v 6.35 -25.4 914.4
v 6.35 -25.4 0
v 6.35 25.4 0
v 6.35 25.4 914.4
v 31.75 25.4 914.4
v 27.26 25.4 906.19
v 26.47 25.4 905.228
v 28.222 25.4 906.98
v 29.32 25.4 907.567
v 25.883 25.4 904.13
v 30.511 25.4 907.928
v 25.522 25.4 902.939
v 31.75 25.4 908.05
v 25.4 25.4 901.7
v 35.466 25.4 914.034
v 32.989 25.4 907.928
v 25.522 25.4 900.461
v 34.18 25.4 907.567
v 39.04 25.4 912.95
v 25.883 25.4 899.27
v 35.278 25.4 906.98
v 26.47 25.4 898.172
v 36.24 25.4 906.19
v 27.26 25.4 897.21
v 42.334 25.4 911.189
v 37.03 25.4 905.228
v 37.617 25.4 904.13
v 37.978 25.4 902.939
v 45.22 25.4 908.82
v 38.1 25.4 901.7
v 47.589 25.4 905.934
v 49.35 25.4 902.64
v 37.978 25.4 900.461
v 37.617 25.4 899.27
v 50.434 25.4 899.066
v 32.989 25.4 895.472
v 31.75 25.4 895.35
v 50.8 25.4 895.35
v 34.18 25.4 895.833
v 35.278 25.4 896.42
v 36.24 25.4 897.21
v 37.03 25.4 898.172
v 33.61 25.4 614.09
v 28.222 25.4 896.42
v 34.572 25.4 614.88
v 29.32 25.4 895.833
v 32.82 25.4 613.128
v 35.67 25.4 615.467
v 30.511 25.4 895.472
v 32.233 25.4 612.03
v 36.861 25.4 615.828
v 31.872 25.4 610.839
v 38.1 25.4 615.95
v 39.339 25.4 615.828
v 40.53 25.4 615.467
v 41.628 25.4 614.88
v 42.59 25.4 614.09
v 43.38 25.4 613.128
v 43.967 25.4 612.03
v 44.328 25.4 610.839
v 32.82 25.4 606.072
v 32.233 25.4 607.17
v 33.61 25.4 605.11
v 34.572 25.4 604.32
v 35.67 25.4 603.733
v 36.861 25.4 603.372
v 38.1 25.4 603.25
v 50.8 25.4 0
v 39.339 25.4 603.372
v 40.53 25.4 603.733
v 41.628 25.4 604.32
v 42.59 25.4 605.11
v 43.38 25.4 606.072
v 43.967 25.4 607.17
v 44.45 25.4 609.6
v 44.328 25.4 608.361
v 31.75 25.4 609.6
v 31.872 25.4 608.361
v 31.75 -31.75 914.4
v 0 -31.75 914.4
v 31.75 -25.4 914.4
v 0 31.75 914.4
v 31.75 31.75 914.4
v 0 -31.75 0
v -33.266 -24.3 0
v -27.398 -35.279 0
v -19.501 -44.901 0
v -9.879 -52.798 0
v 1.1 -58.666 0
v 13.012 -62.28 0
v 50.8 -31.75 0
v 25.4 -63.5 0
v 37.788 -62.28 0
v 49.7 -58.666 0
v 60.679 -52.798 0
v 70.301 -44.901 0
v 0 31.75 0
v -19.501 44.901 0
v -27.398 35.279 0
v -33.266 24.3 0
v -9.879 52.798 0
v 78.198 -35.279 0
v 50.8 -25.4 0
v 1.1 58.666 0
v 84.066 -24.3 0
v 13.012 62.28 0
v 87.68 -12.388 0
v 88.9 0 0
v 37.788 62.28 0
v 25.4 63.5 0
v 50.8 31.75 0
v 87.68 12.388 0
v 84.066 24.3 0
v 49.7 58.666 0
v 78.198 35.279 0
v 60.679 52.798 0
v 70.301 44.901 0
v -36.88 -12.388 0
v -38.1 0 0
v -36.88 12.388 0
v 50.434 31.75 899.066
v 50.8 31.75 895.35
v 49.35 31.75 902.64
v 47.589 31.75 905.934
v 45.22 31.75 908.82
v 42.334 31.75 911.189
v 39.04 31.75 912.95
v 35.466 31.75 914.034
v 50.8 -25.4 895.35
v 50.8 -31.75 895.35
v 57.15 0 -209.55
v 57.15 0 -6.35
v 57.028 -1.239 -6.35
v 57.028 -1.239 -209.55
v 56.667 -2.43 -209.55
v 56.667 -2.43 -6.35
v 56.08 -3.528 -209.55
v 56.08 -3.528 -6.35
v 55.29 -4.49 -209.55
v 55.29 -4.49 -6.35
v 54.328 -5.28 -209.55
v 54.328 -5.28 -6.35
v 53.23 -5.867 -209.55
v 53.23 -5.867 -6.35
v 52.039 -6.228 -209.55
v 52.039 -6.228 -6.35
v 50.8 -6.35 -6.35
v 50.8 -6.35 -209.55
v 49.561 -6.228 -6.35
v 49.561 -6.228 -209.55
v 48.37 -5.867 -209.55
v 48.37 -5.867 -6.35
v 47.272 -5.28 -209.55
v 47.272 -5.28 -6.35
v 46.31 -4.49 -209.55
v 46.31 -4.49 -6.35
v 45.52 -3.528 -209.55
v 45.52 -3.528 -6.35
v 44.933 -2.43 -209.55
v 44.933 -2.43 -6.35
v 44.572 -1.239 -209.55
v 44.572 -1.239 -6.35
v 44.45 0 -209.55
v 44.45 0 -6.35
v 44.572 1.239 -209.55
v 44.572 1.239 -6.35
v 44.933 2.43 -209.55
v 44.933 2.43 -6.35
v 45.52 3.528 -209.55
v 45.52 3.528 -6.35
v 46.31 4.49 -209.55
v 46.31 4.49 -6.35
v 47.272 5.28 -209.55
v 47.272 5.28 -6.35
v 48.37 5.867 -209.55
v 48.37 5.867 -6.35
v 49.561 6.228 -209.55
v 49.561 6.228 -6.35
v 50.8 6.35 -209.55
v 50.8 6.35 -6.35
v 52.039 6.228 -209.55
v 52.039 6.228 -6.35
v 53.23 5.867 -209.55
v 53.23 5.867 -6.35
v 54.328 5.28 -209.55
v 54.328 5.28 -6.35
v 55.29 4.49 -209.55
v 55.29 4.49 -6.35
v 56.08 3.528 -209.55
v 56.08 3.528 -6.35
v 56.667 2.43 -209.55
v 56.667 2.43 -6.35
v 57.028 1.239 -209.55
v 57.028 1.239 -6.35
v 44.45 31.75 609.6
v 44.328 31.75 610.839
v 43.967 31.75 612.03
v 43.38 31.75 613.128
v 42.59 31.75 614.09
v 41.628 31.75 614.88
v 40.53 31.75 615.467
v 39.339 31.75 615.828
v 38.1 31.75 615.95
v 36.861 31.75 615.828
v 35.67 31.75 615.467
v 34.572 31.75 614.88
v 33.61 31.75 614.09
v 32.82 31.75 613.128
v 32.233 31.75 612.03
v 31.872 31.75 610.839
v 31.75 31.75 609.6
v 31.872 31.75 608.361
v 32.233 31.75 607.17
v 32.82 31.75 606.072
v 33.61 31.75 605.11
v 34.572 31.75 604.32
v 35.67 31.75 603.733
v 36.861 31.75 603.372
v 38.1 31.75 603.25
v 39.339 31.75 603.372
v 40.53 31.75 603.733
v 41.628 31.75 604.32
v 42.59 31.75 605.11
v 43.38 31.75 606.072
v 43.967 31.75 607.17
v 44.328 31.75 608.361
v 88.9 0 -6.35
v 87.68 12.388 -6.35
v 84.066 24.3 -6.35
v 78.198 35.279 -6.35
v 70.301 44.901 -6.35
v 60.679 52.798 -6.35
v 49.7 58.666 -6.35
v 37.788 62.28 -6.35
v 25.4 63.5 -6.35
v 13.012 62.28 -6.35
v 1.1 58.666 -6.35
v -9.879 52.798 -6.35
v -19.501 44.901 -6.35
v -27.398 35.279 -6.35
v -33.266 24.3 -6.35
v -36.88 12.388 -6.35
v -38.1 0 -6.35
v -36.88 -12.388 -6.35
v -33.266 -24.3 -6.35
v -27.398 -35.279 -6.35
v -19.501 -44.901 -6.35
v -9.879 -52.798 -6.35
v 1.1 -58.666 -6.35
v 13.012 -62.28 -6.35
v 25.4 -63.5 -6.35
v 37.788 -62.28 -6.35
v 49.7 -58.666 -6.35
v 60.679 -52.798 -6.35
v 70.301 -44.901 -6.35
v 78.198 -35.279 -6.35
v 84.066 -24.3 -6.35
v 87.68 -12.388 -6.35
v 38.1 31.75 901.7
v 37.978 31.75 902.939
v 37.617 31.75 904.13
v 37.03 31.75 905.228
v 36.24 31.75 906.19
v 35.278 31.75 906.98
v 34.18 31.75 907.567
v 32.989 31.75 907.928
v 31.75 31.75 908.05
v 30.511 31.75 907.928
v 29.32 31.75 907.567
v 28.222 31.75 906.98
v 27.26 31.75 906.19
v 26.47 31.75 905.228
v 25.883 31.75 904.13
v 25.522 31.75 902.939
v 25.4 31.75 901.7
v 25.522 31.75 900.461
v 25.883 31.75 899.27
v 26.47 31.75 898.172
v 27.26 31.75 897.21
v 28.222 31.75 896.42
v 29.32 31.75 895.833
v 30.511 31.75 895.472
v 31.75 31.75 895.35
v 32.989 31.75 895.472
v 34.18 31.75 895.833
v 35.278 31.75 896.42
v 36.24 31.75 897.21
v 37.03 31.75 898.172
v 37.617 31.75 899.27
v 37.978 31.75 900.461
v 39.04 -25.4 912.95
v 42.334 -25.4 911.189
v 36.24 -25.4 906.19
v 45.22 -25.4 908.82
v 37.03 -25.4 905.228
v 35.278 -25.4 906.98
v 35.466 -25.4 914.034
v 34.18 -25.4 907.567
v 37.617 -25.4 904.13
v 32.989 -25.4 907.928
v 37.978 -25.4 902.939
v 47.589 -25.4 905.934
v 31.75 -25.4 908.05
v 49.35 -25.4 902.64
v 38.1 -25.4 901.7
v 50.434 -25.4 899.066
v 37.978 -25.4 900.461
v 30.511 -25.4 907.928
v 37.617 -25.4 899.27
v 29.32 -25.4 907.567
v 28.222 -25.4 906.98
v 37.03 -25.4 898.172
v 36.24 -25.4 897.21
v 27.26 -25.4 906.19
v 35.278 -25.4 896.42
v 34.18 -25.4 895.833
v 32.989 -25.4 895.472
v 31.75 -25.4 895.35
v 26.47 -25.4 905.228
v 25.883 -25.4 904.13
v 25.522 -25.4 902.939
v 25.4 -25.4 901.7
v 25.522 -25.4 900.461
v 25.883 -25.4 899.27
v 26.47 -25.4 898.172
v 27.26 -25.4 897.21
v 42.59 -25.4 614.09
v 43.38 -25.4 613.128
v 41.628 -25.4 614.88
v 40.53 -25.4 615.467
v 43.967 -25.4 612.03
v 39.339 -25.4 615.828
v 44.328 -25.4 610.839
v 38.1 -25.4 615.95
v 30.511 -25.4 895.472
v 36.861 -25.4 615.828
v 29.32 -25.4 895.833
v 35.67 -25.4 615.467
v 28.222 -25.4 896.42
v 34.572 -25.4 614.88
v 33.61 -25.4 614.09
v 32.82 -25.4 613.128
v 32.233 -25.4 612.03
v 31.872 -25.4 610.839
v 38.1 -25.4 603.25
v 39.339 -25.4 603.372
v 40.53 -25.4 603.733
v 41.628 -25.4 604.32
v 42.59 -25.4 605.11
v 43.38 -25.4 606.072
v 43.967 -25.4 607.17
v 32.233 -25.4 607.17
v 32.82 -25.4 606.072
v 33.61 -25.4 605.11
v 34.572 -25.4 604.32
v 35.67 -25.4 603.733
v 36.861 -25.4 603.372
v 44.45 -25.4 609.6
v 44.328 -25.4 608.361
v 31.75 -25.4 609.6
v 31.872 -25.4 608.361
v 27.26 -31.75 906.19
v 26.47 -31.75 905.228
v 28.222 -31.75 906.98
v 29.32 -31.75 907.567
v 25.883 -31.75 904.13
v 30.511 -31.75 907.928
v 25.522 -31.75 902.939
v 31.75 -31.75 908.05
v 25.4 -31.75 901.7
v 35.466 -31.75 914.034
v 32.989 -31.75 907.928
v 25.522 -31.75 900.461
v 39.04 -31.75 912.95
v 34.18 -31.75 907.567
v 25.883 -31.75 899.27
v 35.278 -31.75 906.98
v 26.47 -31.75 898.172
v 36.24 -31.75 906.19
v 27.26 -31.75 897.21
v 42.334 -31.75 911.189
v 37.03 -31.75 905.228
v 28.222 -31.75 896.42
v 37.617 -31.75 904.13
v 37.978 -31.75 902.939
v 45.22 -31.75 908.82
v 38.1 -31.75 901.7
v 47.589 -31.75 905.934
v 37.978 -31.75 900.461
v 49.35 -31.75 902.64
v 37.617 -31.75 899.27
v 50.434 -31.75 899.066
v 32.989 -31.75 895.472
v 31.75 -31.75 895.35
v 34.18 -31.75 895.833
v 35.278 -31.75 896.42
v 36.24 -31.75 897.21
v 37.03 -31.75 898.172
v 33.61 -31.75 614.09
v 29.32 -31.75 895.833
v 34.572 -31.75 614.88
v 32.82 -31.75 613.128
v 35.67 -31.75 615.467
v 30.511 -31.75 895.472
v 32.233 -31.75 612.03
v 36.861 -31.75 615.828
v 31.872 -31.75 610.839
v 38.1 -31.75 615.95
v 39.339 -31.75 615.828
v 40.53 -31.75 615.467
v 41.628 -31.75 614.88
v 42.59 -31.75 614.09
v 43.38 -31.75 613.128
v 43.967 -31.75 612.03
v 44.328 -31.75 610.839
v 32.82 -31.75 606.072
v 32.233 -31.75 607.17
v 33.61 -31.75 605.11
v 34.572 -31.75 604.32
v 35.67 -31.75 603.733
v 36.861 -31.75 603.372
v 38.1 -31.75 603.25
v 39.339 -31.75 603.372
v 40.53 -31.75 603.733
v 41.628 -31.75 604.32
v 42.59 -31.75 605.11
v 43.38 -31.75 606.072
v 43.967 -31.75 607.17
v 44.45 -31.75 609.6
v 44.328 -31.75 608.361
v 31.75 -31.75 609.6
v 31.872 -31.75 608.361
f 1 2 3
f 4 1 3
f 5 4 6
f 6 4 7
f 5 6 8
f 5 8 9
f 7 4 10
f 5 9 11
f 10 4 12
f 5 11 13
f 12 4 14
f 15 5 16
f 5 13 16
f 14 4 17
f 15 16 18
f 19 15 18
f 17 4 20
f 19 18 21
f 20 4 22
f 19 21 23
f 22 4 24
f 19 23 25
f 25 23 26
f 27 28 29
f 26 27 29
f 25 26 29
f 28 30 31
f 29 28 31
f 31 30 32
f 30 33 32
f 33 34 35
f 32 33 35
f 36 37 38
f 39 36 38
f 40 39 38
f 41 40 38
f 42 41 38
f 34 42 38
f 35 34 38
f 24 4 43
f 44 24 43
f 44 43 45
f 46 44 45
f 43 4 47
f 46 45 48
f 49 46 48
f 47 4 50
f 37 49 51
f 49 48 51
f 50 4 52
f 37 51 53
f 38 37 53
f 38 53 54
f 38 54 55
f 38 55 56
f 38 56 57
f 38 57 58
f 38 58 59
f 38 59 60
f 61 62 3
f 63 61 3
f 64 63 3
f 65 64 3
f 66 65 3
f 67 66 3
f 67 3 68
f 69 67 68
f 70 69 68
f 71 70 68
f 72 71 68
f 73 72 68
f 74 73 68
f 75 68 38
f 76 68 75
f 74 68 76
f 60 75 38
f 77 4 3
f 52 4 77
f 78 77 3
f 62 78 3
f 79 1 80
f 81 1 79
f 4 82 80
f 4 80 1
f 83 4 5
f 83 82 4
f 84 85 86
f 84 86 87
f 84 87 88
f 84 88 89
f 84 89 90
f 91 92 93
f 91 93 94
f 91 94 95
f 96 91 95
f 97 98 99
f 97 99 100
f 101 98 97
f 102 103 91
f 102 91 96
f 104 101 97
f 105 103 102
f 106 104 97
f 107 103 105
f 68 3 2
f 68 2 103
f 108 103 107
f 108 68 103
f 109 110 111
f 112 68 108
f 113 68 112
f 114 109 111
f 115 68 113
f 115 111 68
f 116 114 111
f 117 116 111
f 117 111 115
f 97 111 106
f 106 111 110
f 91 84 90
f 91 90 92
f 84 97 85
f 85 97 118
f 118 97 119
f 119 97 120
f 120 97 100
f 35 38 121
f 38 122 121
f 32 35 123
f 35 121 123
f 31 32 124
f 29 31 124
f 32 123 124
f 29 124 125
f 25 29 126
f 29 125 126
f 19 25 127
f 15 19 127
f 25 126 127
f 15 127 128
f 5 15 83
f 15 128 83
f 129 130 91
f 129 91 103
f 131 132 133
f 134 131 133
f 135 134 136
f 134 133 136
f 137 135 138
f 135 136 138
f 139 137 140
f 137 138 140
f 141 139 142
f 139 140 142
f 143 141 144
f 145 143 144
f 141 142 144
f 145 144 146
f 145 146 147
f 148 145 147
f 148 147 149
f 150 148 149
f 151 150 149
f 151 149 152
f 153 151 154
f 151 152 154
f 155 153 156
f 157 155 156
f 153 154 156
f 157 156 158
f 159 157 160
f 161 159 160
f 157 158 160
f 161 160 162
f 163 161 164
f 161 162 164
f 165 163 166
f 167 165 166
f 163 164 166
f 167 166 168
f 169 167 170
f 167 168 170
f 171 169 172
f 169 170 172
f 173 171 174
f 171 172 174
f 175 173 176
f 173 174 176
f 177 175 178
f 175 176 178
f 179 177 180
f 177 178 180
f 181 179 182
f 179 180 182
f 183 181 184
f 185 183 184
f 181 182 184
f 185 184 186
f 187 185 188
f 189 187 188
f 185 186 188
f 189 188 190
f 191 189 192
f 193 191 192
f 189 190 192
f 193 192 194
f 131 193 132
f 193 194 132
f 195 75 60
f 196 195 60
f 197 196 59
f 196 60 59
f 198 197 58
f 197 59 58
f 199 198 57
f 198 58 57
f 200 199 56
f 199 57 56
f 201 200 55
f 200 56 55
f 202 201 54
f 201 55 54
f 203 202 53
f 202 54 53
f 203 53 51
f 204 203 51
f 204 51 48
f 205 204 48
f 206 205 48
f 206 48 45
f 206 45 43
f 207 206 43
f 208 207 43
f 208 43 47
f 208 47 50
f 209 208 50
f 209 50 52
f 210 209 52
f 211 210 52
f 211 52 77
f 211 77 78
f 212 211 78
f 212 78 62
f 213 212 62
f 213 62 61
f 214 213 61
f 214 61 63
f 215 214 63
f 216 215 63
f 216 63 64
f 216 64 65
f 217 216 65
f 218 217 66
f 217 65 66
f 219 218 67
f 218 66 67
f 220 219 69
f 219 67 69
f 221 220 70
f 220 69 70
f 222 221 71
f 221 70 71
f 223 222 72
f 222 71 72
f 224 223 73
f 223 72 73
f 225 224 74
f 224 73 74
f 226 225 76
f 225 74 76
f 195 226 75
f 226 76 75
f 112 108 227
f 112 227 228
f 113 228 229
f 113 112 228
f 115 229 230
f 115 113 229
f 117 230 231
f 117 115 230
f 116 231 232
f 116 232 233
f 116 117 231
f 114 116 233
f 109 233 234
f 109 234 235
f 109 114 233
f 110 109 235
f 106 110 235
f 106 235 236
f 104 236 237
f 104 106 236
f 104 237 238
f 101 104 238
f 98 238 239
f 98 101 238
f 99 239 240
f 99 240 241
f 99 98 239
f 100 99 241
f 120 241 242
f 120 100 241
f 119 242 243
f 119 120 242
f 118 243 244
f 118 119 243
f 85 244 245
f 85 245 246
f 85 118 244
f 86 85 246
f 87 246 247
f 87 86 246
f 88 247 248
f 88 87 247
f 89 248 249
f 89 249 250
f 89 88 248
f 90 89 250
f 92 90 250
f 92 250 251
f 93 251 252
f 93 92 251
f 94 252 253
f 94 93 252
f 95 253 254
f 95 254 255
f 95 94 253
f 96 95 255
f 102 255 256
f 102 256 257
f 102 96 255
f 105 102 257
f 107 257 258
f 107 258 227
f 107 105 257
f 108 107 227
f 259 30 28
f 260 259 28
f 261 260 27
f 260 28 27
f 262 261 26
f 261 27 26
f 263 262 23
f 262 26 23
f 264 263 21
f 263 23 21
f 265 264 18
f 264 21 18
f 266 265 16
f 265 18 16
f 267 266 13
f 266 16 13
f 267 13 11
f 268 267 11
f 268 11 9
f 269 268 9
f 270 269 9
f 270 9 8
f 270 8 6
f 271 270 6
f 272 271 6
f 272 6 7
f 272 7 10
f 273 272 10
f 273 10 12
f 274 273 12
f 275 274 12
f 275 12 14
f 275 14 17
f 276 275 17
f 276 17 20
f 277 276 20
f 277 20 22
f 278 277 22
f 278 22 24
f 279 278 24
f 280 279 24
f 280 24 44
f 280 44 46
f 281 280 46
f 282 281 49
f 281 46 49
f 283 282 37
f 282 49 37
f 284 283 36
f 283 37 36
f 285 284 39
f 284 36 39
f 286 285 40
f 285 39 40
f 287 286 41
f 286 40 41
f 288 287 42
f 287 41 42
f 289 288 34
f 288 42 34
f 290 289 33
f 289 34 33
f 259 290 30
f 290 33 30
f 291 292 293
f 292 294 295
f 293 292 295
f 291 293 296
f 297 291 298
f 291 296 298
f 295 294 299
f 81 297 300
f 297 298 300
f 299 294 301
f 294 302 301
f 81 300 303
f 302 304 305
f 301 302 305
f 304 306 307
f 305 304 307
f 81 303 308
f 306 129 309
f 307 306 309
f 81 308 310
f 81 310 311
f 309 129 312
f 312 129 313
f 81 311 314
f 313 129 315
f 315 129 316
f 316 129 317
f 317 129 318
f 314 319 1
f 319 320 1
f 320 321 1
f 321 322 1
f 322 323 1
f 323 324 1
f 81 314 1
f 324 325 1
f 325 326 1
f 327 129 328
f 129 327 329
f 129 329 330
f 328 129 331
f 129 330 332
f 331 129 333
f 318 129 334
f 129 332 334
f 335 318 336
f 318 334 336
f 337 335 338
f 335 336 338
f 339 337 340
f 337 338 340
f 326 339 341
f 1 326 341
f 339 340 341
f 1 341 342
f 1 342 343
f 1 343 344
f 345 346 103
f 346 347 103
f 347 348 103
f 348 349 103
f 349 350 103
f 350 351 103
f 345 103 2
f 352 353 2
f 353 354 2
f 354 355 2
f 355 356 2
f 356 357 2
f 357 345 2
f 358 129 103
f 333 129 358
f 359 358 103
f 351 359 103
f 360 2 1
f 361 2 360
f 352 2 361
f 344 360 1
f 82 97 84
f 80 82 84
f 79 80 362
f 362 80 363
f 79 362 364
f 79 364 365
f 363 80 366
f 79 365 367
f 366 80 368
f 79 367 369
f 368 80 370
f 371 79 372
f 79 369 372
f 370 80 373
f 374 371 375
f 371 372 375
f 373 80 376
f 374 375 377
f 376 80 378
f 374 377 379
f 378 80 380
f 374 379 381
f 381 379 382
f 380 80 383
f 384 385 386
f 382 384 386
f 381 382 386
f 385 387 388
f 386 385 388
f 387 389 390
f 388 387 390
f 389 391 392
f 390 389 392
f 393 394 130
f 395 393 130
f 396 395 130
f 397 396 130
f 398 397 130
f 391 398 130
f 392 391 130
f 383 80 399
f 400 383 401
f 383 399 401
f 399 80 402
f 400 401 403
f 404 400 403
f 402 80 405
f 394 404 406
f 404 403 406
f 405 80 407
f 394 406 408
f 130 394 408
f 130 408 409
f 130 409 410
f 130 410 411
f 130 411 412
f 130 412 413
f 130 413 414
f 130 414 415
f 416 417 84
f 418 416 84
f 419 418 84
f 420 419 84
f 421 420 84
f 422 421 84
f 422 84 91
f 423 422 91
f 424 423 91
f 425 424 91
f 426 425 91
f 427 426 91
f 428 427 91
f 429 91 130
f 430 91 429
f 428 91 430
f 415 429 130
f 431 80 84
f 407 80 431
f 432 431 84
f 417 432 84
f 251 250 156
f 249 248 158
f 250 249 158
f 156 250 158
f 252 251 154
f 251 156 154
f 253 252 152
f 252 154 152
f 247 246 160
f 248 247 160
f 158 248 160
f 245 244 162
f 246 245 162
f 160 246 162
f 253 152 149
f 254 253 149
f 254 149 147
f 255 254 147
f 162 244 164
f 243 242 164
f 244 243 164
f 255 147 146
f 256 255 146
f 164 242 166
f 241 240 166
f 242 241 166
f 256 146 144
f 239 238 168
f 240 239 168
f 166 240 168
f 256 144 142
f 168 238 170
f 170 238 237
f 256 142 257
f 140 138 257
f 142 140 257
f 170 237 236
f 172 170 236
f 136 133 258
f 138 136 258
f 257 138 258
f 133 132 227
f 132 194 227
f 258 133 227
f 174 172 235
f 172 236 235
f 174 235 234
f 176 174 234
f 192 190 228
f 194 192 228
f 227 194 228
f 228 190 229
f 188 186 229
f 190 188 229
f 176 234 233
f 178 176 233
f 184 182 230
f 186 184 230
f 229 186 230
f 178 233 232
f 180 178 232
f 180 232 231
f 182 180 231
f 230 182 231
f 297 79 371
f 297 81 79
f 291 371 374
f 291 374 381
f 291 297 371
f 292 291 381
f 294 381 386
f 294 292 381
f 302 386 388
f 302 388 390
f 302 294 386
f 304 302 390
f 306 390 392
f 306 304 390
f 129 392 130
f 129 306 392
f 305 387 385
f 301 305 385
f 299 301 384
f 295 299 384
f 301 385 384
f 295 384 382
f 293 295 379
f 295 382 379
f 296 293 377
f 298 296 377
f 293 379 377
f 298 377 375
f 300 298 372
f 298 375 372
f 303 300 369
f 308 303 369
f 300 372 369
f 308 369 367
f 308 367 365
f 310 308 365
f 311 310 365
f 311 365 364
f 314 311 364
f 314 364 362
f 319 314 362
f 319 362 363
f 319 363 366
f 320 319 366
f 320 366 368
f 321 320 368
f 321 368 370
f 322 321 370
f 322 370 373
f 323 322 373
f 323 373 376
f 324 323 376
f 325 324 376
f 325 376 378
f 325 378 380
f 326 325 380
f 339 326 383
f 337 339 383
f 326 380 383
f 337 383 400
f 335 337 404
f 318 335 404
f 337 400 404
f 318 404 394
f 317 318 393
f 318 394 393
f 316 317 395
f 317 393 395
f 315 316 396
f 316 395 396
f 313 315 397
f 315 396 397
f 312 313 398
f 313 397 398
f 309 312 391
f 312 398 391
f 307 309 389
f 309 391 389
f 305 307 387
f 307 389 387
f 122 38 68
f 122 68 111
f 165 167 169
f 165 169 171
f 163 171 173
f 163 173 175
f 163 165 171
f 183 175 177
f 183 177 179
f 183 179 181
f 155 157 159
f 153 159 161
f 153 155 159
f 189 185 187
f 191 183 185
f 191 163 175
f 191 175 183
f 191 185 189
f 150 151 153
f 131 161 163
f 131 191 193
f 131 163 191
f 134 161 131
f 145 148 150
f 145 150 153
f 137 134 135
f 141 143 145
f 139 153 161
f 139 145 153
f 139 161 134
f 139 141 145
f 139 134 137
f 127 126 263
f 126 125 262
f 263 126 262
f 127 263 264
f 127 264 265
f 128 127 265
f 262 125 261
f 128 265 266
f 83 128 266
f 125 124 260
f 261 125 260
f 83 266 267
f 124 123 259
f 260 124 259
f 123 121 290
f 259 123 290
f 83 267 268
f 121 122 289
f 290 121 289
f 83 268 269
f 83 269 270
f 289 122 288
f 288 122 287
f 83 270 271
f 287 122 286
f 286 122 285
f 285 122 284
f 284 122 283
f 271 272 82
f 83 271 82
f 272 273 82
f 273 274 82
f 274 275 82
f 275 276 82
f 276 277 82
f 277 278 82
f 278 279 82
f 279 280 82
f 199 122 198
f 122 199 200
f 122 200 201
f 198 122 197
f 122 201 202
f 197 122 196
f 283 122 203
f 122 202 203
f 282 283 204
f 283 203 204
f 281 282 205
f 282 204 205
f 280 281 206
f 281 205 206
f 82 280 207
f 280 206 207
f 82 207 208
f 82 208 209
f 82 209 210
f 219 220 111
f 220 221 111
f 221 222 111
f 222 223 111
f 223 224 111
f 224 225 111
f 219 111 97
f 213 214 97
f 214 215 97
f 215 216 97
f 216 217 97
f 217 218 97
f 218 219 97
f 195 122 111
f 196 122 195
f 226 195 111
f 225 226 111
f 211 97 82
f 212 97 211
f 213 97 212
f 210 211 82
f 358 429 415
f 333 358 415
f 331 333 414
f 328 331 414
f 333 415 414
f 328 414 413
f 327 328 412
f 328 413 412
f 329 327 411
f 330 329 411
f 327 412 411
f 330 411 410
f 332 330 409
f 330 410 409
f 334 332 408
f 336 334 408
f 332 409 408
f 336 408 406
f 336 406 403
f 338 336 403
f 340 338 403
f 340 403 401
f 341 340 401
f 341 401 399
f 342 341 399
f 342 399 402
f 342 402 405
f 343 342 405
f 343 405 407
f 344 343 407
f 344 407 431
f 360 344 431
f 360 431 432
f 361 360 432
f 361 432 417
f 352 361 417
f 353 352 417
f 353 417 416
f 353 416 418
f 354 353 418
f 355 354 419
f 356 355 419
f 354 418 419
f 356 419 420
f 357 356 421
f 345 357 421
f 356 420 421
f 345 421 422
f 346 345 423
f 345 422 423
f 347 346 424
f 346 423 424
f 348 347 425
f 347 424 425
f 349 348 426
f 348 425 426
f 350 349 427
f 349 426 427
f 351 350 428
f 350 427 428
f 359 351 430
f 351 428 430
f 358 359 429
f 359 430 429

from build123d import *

# Parameters (mm, degrees)
F1_DEPTH = 914.4
F2_R     = 6.35
F3_DEPTH = 63.501
F4_R     = 19.05
F5_R     = 63.5
F6_DEPTH = 6.35
F7_R     = 6.35
F8_DEPTH = 203.2


with BuildPart() as f1:
    # F0 (on Top) → F1 (new body)
    with BuildSketch(Plane.XY):
        Polygon((50.8, 31.75), (0, 31.75), (0, -31.75), (50.8, -31.75), (50.8, -25.4), (6.35, -25.4), (6.35, 25.4), (50.8, 25.4), align=None)
    extrude(amount=F1_DEPTH)

    # F2 (on face) → F3 (cut, through all)
    with BuildSketch(Plane.XZ.offset(31.75)):
        with Locations((31.75, 901.7)):
            Circle(F2_R)
        with Locations((38.1, 609.6)):
            Circle(F2_R)
    extrude(amount=-F3_DEPTH, mode=Mode.SUBTRACT)

    # F4
    f4_edges = [f1.edges().sort_by_distance(p)[0] for p in [
        (50.8, -28.575, 914.4),
        (50.8, 28.575, 914.4),
    ]]
    fillet(f4_edges, radius=F4_R)

    # F5 (on Top) → F6 (join)
    with BuildSketch(Plane.XY):
        with Locations((25.4, 0)):
            Circle(F5_R)
    extrude(amount=-F6_DEPTH)

    # F7 (on face) → F8 (join)
    with BuildSketch(Plane(origin=(0, 0, -6.35), x_dir=(1, 0, 0), z_dir=(0, 0, -1))):
        with Locations((50.8, 0)):
            Circle(F7_R)
    extrude(amount=F8_DEPTH)


solid = f1.part
